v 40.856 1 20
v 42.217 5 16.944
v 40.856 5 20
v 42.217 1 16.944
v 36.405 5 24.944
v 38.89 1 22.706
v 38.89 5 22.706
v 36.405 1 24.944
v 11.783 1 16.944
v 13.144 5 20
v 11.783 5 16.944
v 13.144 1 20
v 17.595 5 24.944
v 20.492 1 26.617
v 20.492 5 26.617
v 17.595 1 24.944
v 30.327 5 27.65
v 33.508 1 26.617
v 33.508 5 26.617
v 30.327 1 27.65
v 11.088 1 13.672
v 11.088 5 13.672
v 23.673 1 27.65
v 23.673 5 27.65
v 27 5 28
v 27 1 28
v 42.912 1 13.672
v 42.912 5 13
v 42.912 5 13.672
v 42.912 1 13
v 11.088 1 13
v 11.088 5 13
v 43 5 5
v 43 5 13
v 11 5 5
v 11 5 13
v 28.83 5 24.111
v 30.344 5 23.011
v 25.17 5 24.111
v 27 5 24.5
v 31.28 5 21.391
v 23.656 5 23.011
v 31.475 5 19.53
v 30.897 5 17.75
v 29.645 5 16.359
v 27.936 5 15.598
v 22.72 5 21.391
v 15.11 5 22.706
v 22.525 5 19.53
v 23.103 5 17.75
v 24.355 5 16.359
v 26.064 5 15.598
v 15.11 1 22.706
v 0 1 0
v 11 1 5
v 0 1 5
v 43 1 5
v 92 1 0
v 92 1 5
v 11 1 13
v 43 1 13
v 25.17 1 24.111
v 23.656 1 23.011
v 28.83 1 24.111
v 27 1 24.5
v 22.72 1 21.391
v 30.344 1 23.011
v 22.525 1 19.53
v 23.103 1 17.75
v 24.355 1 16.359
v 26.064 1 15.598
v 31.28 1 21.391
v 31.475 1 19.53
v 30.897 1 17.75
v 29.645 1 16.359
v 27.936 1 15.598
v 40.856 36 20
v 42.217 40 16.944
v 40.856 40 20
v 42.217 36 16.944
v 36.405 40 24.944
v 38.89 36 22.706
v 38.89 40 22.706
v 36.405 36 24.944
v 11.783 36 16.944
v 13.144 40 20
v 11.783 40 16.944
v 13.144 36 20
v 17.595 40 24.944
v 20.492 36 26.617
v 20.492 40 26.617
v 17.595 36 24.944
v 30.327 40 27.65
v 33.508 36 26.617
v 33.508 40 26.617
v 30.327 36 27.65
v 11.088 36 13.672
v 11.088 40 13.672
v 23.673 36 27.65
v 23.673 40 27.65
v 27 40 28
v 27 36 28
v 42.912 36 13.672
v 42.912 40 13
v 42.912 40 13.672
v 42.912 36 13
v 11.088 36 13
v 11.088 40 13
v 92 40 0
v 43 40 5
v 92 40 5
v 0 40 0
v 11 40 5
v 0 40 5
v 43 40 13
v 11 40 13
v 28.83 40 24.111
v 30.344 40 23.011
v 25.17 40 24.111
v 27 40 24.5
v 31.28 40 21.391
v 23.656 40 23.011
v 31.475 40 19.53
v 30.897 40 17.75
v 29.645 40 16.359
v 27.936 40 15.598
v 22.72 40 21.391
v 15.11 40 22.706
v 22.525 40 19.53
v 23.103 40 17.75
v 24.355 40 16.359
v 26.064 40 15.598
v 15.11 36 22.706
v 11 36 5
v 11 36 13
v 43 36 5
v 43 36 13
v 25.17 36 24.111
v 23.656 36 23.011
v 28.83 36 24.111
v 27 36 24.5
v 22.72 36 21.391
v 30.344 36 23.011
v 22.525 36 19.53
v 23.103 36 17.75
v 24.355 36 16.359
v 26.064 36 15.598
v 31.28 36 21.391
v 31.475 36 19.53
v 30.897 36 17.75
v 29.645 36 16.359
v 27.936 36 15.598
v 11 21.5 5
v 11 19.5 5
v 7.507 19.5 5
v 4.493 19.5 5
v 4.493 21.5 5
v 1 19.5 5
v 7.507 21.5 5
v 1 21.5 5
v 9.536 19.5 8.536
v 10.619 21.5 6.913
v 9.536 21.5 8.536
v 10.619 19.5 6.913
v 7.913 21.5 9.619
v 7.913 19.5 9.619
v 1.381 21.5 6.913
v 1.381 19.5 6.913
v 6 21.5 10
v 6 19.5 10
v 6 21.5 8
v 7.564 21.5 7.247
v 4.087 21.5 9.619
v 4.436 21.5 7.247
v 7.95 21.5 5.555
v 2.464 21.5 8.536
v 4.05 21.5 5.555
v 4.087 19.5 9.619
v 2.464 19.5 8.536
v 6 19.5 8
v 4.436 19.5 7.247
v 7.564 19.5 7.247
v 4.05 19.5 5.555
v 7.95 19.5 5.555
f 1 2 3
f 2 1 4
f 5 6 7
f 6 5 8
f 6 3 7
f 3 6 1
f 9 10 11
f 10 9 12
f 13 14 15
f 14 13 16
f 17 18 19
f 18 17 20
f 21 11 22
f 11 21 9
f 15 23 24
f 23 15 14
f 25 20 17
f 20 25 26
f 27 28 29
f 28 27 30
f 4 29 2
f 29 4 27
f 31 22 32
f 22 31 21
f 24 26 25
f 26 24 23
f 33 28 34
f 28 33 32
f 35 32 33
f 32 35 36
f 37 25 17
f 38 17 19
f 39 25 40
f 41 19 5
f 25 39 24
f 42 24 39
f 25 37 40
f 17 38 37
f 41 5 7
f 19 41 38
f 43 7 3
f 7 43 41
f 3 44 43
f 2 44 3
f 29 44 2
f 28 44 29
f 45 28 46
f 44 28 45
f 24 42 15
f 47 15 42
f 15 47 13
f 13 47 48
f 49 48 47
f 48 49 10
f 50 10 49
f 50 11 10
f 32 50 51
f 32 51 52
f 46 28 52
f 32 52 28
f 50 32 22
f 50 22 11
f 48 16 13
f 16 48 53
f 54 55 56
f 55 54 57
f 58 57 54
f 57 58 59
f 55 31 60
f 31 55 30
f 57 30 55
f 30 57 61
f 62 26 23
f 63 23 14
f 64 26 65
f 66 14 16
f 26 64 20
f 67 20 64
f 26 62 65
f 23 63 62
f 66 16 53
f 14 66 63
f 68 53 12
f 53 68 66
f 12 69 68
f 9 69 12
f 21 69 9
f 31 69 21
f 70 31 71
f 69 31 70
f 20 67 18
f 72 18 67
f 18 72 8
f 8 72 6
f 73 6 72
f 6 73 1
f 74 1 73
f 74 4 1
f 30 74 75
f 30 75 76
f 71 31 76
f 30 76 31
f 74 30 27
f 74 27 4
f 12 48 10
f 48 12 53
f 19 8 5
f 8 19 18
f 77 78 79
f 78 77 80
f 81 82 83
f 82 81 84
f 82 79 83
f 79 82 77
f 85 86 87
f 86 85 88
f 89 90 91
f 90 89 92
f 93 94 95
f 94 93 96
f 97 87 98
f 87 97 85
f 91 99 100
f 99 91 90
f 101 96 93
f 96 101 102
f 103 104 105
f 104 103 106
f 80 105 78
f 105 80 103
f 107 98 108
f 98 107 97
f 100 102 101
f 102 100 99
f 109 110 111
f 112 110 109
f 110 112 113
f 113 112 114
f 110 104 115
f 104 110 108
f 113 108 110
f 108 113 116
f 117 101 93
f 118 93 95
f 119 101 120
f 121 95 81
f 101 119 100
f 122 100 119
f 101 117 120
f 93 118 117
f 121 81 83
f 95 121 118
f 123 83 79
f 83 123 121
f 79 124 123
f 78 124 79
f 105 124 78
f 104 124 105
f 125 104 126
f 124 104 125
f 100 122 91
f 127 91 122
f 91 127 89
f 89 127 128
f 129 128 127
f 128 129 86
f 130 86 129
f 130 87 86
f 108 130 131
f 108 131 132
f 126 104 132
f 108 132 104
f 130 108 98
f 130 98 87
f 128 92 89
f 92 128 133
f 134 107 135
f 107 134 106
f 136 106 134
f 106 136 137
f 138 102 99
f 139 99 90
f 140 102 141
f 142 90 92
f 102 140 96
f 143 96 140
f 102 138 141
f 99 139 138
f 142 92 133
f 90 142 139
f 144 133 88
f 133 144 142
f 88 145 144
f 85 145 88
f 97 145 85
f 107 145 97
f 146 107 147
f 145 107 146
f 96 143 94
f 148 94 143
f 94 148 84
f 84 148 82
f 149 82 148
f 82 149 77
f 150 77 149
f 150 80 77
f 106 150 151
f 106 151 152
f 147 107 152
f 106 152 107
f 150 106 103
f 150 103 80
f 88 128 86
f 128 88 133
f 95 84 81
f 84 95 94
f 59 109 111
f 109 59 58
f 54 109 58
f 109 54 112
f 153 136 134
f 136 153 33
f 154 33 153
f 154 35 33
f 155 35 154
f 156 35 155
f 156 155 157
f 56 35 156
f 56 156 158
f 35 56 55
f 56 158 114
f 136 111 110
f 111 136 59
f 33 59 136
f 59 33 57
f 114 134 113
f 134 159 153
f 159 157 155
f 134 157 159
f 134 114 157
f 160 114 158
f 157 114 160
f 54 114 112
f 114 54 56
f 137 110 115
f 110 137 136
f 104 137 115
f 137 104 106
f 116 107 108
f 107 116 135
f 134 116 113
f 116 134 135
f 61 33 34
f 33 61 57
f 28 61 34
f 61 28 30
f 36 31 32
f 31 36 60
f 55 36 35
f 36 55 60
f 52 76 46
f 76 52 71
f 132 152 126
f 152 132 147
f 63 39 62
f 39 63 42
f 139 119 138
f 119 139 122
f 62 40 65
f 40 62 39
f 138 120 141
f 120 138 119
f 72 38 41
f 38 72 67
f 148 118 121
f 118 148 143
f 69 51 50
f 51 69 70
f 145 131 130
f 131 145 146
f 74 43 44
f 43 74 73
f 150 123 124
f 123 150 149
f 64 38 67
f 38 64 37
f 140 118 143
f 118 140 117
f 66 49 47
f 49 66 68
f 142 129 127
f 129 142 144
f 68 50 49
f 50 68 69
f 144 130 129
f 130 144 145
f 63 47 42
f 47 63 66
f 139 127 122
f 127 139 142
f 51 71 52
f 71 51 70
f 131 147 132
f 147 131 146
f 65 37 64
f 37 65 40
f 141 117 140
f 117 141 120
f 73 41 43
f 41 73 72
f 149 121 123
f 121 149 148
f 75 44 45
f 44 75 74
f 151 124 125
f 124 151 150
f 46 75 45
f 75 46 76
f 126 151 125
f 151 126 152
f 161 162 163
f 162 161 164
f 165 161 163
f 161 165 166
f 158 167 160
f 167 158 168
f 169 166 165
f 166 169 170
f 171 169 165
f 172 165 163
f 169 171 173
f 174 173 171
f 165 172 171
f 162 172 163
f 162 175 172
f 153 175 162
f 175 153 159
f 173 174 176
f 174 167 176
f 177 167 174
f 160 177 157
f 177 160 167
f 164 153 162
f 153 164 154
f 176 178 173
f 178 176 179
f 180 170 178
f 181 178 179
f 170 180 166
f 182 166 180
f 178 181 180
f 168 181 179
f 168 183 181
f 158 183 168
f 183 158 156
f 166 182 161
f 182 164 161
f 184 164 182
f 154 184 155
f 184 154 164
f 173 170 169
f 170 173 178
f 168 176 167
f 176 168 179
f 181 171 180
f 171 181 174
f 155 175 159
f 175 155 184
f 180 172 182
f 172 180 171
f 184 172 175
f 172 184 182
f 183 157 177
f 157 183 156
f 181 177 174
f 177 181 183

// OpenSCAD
base_plate_width = 100;
base_plate_length = 50;
base_plate_height = 5;
base_plate_dimensions = [base_plate_width,base_plate_length,base_plate_height];

up_plate_width = 5;
up_plate_length = 50;
up_plate_height = 50;
up_plate_dimensions = [up_plate_width,up_plate_length,up_plate_height];

wall_plate_width= 100;
wall_plate_length = 5;
wall_plate_height = 50;

wall_plate_dimensions = [wall_plate_width,wall_plate_length,wall_plate_height];


module halfcylinder(he,rd) {
	difference(){
		cylinder (h=he,r=rd);
		translate([0,-rd-0.1,-0.1]) cube([rd+0.1,rd*2+0.2,he+0.2]);
	} // df
} // mod


cylinder_radius = 15;
cylinder_height = 5;

/*
translate([0,0,0])
difference(){
	union(){
		cube(base_plate_dimensions);
		cube(up_plate_dimensions);
		cube(wall_plate_dimensions);
		
		translate([0,45,0])
		cube(wall_plate_dimensions);
	}
	
	translate([5,-1,50])
	rotate([0,-340,0])
	//color("orange")
	cube([base_plate_width+5, base_plate_length+10, base_plate_height+28]);	
	
	translate([35,-10,30])
	//color("purple")
	rotate([270,90,0])
	cylinder(h=120, r=4.5);
	
	union(){
	translate([10,25,25])
	rotate([0,270,0])
	//color("black")
	halfcylinder(15, 20);
	
	//color("green")
	translate([-2,5.2,24])
	cube([10,39.6,20]);
	}
	
		
	translate([7,5,25])
	halfcylinder(2,5);

}


*/

base2_plate_width = 92;
base2_plate_length = 39;
base2_plate_height = 5;
base2_plate_dimensions = [base2_plate_width,base2_plate_length,base2_plate_height];


up2_plate_width = 5;
up2_plate_length = 38;
up2_plate_height = 35;
up2_plate_dimensions = [up2_plate_width,up2_plate_length,up2_plate_height];

cylinder2_radius = 16;
cylinder2_height = 4;


// use this for 2D rendering
//projection(){
translate([-8,40,50])
rotate([90,0,0])
union(){
difference(){
	rotate([90,0,0])
	union(){
		
		translate([8,0,45])
		cube(base2_plate_dimensions);
		
		translate([19,0,37])
		//color("white")
		cube([cylinder2_radius*2, cylinder2_height, 11]);
		
		rotate([270,270,0])
		translate([38,35,base2_plate_length-4])
		halfcylinder(cylinder2_height,cylinder2_radius);

		translate([19,base2_plate_length-4,37])
		//color("black")
		cube([cylinder2_radius*2, cylinder2_height, 11]);
		
		rotate([270,270,0])
		translate([38,35,0])
		halfcylinder(cylinder2_height,cylinder2_radius);
	}	
	rotate([90,0,0])
	translate([35,-10,30])
	//color("purple")
	rotate([270,90,0])
	//rotate([180,00,90])
	cylinder(h=120, r=4.5);
}

rotate([90,0,0])
difference(){
		translate([14, base2_plate_length/2-1, 45])
		rotate([270,270,0])
		//color("pink")
		halfcylinder(2,5);
		
		translate([14, base2_plate_length/2-1, 44])
		rotate([90,90,0])
		cylinder(d = 4, h=10 + 5, center = true);		
//}
}

}
